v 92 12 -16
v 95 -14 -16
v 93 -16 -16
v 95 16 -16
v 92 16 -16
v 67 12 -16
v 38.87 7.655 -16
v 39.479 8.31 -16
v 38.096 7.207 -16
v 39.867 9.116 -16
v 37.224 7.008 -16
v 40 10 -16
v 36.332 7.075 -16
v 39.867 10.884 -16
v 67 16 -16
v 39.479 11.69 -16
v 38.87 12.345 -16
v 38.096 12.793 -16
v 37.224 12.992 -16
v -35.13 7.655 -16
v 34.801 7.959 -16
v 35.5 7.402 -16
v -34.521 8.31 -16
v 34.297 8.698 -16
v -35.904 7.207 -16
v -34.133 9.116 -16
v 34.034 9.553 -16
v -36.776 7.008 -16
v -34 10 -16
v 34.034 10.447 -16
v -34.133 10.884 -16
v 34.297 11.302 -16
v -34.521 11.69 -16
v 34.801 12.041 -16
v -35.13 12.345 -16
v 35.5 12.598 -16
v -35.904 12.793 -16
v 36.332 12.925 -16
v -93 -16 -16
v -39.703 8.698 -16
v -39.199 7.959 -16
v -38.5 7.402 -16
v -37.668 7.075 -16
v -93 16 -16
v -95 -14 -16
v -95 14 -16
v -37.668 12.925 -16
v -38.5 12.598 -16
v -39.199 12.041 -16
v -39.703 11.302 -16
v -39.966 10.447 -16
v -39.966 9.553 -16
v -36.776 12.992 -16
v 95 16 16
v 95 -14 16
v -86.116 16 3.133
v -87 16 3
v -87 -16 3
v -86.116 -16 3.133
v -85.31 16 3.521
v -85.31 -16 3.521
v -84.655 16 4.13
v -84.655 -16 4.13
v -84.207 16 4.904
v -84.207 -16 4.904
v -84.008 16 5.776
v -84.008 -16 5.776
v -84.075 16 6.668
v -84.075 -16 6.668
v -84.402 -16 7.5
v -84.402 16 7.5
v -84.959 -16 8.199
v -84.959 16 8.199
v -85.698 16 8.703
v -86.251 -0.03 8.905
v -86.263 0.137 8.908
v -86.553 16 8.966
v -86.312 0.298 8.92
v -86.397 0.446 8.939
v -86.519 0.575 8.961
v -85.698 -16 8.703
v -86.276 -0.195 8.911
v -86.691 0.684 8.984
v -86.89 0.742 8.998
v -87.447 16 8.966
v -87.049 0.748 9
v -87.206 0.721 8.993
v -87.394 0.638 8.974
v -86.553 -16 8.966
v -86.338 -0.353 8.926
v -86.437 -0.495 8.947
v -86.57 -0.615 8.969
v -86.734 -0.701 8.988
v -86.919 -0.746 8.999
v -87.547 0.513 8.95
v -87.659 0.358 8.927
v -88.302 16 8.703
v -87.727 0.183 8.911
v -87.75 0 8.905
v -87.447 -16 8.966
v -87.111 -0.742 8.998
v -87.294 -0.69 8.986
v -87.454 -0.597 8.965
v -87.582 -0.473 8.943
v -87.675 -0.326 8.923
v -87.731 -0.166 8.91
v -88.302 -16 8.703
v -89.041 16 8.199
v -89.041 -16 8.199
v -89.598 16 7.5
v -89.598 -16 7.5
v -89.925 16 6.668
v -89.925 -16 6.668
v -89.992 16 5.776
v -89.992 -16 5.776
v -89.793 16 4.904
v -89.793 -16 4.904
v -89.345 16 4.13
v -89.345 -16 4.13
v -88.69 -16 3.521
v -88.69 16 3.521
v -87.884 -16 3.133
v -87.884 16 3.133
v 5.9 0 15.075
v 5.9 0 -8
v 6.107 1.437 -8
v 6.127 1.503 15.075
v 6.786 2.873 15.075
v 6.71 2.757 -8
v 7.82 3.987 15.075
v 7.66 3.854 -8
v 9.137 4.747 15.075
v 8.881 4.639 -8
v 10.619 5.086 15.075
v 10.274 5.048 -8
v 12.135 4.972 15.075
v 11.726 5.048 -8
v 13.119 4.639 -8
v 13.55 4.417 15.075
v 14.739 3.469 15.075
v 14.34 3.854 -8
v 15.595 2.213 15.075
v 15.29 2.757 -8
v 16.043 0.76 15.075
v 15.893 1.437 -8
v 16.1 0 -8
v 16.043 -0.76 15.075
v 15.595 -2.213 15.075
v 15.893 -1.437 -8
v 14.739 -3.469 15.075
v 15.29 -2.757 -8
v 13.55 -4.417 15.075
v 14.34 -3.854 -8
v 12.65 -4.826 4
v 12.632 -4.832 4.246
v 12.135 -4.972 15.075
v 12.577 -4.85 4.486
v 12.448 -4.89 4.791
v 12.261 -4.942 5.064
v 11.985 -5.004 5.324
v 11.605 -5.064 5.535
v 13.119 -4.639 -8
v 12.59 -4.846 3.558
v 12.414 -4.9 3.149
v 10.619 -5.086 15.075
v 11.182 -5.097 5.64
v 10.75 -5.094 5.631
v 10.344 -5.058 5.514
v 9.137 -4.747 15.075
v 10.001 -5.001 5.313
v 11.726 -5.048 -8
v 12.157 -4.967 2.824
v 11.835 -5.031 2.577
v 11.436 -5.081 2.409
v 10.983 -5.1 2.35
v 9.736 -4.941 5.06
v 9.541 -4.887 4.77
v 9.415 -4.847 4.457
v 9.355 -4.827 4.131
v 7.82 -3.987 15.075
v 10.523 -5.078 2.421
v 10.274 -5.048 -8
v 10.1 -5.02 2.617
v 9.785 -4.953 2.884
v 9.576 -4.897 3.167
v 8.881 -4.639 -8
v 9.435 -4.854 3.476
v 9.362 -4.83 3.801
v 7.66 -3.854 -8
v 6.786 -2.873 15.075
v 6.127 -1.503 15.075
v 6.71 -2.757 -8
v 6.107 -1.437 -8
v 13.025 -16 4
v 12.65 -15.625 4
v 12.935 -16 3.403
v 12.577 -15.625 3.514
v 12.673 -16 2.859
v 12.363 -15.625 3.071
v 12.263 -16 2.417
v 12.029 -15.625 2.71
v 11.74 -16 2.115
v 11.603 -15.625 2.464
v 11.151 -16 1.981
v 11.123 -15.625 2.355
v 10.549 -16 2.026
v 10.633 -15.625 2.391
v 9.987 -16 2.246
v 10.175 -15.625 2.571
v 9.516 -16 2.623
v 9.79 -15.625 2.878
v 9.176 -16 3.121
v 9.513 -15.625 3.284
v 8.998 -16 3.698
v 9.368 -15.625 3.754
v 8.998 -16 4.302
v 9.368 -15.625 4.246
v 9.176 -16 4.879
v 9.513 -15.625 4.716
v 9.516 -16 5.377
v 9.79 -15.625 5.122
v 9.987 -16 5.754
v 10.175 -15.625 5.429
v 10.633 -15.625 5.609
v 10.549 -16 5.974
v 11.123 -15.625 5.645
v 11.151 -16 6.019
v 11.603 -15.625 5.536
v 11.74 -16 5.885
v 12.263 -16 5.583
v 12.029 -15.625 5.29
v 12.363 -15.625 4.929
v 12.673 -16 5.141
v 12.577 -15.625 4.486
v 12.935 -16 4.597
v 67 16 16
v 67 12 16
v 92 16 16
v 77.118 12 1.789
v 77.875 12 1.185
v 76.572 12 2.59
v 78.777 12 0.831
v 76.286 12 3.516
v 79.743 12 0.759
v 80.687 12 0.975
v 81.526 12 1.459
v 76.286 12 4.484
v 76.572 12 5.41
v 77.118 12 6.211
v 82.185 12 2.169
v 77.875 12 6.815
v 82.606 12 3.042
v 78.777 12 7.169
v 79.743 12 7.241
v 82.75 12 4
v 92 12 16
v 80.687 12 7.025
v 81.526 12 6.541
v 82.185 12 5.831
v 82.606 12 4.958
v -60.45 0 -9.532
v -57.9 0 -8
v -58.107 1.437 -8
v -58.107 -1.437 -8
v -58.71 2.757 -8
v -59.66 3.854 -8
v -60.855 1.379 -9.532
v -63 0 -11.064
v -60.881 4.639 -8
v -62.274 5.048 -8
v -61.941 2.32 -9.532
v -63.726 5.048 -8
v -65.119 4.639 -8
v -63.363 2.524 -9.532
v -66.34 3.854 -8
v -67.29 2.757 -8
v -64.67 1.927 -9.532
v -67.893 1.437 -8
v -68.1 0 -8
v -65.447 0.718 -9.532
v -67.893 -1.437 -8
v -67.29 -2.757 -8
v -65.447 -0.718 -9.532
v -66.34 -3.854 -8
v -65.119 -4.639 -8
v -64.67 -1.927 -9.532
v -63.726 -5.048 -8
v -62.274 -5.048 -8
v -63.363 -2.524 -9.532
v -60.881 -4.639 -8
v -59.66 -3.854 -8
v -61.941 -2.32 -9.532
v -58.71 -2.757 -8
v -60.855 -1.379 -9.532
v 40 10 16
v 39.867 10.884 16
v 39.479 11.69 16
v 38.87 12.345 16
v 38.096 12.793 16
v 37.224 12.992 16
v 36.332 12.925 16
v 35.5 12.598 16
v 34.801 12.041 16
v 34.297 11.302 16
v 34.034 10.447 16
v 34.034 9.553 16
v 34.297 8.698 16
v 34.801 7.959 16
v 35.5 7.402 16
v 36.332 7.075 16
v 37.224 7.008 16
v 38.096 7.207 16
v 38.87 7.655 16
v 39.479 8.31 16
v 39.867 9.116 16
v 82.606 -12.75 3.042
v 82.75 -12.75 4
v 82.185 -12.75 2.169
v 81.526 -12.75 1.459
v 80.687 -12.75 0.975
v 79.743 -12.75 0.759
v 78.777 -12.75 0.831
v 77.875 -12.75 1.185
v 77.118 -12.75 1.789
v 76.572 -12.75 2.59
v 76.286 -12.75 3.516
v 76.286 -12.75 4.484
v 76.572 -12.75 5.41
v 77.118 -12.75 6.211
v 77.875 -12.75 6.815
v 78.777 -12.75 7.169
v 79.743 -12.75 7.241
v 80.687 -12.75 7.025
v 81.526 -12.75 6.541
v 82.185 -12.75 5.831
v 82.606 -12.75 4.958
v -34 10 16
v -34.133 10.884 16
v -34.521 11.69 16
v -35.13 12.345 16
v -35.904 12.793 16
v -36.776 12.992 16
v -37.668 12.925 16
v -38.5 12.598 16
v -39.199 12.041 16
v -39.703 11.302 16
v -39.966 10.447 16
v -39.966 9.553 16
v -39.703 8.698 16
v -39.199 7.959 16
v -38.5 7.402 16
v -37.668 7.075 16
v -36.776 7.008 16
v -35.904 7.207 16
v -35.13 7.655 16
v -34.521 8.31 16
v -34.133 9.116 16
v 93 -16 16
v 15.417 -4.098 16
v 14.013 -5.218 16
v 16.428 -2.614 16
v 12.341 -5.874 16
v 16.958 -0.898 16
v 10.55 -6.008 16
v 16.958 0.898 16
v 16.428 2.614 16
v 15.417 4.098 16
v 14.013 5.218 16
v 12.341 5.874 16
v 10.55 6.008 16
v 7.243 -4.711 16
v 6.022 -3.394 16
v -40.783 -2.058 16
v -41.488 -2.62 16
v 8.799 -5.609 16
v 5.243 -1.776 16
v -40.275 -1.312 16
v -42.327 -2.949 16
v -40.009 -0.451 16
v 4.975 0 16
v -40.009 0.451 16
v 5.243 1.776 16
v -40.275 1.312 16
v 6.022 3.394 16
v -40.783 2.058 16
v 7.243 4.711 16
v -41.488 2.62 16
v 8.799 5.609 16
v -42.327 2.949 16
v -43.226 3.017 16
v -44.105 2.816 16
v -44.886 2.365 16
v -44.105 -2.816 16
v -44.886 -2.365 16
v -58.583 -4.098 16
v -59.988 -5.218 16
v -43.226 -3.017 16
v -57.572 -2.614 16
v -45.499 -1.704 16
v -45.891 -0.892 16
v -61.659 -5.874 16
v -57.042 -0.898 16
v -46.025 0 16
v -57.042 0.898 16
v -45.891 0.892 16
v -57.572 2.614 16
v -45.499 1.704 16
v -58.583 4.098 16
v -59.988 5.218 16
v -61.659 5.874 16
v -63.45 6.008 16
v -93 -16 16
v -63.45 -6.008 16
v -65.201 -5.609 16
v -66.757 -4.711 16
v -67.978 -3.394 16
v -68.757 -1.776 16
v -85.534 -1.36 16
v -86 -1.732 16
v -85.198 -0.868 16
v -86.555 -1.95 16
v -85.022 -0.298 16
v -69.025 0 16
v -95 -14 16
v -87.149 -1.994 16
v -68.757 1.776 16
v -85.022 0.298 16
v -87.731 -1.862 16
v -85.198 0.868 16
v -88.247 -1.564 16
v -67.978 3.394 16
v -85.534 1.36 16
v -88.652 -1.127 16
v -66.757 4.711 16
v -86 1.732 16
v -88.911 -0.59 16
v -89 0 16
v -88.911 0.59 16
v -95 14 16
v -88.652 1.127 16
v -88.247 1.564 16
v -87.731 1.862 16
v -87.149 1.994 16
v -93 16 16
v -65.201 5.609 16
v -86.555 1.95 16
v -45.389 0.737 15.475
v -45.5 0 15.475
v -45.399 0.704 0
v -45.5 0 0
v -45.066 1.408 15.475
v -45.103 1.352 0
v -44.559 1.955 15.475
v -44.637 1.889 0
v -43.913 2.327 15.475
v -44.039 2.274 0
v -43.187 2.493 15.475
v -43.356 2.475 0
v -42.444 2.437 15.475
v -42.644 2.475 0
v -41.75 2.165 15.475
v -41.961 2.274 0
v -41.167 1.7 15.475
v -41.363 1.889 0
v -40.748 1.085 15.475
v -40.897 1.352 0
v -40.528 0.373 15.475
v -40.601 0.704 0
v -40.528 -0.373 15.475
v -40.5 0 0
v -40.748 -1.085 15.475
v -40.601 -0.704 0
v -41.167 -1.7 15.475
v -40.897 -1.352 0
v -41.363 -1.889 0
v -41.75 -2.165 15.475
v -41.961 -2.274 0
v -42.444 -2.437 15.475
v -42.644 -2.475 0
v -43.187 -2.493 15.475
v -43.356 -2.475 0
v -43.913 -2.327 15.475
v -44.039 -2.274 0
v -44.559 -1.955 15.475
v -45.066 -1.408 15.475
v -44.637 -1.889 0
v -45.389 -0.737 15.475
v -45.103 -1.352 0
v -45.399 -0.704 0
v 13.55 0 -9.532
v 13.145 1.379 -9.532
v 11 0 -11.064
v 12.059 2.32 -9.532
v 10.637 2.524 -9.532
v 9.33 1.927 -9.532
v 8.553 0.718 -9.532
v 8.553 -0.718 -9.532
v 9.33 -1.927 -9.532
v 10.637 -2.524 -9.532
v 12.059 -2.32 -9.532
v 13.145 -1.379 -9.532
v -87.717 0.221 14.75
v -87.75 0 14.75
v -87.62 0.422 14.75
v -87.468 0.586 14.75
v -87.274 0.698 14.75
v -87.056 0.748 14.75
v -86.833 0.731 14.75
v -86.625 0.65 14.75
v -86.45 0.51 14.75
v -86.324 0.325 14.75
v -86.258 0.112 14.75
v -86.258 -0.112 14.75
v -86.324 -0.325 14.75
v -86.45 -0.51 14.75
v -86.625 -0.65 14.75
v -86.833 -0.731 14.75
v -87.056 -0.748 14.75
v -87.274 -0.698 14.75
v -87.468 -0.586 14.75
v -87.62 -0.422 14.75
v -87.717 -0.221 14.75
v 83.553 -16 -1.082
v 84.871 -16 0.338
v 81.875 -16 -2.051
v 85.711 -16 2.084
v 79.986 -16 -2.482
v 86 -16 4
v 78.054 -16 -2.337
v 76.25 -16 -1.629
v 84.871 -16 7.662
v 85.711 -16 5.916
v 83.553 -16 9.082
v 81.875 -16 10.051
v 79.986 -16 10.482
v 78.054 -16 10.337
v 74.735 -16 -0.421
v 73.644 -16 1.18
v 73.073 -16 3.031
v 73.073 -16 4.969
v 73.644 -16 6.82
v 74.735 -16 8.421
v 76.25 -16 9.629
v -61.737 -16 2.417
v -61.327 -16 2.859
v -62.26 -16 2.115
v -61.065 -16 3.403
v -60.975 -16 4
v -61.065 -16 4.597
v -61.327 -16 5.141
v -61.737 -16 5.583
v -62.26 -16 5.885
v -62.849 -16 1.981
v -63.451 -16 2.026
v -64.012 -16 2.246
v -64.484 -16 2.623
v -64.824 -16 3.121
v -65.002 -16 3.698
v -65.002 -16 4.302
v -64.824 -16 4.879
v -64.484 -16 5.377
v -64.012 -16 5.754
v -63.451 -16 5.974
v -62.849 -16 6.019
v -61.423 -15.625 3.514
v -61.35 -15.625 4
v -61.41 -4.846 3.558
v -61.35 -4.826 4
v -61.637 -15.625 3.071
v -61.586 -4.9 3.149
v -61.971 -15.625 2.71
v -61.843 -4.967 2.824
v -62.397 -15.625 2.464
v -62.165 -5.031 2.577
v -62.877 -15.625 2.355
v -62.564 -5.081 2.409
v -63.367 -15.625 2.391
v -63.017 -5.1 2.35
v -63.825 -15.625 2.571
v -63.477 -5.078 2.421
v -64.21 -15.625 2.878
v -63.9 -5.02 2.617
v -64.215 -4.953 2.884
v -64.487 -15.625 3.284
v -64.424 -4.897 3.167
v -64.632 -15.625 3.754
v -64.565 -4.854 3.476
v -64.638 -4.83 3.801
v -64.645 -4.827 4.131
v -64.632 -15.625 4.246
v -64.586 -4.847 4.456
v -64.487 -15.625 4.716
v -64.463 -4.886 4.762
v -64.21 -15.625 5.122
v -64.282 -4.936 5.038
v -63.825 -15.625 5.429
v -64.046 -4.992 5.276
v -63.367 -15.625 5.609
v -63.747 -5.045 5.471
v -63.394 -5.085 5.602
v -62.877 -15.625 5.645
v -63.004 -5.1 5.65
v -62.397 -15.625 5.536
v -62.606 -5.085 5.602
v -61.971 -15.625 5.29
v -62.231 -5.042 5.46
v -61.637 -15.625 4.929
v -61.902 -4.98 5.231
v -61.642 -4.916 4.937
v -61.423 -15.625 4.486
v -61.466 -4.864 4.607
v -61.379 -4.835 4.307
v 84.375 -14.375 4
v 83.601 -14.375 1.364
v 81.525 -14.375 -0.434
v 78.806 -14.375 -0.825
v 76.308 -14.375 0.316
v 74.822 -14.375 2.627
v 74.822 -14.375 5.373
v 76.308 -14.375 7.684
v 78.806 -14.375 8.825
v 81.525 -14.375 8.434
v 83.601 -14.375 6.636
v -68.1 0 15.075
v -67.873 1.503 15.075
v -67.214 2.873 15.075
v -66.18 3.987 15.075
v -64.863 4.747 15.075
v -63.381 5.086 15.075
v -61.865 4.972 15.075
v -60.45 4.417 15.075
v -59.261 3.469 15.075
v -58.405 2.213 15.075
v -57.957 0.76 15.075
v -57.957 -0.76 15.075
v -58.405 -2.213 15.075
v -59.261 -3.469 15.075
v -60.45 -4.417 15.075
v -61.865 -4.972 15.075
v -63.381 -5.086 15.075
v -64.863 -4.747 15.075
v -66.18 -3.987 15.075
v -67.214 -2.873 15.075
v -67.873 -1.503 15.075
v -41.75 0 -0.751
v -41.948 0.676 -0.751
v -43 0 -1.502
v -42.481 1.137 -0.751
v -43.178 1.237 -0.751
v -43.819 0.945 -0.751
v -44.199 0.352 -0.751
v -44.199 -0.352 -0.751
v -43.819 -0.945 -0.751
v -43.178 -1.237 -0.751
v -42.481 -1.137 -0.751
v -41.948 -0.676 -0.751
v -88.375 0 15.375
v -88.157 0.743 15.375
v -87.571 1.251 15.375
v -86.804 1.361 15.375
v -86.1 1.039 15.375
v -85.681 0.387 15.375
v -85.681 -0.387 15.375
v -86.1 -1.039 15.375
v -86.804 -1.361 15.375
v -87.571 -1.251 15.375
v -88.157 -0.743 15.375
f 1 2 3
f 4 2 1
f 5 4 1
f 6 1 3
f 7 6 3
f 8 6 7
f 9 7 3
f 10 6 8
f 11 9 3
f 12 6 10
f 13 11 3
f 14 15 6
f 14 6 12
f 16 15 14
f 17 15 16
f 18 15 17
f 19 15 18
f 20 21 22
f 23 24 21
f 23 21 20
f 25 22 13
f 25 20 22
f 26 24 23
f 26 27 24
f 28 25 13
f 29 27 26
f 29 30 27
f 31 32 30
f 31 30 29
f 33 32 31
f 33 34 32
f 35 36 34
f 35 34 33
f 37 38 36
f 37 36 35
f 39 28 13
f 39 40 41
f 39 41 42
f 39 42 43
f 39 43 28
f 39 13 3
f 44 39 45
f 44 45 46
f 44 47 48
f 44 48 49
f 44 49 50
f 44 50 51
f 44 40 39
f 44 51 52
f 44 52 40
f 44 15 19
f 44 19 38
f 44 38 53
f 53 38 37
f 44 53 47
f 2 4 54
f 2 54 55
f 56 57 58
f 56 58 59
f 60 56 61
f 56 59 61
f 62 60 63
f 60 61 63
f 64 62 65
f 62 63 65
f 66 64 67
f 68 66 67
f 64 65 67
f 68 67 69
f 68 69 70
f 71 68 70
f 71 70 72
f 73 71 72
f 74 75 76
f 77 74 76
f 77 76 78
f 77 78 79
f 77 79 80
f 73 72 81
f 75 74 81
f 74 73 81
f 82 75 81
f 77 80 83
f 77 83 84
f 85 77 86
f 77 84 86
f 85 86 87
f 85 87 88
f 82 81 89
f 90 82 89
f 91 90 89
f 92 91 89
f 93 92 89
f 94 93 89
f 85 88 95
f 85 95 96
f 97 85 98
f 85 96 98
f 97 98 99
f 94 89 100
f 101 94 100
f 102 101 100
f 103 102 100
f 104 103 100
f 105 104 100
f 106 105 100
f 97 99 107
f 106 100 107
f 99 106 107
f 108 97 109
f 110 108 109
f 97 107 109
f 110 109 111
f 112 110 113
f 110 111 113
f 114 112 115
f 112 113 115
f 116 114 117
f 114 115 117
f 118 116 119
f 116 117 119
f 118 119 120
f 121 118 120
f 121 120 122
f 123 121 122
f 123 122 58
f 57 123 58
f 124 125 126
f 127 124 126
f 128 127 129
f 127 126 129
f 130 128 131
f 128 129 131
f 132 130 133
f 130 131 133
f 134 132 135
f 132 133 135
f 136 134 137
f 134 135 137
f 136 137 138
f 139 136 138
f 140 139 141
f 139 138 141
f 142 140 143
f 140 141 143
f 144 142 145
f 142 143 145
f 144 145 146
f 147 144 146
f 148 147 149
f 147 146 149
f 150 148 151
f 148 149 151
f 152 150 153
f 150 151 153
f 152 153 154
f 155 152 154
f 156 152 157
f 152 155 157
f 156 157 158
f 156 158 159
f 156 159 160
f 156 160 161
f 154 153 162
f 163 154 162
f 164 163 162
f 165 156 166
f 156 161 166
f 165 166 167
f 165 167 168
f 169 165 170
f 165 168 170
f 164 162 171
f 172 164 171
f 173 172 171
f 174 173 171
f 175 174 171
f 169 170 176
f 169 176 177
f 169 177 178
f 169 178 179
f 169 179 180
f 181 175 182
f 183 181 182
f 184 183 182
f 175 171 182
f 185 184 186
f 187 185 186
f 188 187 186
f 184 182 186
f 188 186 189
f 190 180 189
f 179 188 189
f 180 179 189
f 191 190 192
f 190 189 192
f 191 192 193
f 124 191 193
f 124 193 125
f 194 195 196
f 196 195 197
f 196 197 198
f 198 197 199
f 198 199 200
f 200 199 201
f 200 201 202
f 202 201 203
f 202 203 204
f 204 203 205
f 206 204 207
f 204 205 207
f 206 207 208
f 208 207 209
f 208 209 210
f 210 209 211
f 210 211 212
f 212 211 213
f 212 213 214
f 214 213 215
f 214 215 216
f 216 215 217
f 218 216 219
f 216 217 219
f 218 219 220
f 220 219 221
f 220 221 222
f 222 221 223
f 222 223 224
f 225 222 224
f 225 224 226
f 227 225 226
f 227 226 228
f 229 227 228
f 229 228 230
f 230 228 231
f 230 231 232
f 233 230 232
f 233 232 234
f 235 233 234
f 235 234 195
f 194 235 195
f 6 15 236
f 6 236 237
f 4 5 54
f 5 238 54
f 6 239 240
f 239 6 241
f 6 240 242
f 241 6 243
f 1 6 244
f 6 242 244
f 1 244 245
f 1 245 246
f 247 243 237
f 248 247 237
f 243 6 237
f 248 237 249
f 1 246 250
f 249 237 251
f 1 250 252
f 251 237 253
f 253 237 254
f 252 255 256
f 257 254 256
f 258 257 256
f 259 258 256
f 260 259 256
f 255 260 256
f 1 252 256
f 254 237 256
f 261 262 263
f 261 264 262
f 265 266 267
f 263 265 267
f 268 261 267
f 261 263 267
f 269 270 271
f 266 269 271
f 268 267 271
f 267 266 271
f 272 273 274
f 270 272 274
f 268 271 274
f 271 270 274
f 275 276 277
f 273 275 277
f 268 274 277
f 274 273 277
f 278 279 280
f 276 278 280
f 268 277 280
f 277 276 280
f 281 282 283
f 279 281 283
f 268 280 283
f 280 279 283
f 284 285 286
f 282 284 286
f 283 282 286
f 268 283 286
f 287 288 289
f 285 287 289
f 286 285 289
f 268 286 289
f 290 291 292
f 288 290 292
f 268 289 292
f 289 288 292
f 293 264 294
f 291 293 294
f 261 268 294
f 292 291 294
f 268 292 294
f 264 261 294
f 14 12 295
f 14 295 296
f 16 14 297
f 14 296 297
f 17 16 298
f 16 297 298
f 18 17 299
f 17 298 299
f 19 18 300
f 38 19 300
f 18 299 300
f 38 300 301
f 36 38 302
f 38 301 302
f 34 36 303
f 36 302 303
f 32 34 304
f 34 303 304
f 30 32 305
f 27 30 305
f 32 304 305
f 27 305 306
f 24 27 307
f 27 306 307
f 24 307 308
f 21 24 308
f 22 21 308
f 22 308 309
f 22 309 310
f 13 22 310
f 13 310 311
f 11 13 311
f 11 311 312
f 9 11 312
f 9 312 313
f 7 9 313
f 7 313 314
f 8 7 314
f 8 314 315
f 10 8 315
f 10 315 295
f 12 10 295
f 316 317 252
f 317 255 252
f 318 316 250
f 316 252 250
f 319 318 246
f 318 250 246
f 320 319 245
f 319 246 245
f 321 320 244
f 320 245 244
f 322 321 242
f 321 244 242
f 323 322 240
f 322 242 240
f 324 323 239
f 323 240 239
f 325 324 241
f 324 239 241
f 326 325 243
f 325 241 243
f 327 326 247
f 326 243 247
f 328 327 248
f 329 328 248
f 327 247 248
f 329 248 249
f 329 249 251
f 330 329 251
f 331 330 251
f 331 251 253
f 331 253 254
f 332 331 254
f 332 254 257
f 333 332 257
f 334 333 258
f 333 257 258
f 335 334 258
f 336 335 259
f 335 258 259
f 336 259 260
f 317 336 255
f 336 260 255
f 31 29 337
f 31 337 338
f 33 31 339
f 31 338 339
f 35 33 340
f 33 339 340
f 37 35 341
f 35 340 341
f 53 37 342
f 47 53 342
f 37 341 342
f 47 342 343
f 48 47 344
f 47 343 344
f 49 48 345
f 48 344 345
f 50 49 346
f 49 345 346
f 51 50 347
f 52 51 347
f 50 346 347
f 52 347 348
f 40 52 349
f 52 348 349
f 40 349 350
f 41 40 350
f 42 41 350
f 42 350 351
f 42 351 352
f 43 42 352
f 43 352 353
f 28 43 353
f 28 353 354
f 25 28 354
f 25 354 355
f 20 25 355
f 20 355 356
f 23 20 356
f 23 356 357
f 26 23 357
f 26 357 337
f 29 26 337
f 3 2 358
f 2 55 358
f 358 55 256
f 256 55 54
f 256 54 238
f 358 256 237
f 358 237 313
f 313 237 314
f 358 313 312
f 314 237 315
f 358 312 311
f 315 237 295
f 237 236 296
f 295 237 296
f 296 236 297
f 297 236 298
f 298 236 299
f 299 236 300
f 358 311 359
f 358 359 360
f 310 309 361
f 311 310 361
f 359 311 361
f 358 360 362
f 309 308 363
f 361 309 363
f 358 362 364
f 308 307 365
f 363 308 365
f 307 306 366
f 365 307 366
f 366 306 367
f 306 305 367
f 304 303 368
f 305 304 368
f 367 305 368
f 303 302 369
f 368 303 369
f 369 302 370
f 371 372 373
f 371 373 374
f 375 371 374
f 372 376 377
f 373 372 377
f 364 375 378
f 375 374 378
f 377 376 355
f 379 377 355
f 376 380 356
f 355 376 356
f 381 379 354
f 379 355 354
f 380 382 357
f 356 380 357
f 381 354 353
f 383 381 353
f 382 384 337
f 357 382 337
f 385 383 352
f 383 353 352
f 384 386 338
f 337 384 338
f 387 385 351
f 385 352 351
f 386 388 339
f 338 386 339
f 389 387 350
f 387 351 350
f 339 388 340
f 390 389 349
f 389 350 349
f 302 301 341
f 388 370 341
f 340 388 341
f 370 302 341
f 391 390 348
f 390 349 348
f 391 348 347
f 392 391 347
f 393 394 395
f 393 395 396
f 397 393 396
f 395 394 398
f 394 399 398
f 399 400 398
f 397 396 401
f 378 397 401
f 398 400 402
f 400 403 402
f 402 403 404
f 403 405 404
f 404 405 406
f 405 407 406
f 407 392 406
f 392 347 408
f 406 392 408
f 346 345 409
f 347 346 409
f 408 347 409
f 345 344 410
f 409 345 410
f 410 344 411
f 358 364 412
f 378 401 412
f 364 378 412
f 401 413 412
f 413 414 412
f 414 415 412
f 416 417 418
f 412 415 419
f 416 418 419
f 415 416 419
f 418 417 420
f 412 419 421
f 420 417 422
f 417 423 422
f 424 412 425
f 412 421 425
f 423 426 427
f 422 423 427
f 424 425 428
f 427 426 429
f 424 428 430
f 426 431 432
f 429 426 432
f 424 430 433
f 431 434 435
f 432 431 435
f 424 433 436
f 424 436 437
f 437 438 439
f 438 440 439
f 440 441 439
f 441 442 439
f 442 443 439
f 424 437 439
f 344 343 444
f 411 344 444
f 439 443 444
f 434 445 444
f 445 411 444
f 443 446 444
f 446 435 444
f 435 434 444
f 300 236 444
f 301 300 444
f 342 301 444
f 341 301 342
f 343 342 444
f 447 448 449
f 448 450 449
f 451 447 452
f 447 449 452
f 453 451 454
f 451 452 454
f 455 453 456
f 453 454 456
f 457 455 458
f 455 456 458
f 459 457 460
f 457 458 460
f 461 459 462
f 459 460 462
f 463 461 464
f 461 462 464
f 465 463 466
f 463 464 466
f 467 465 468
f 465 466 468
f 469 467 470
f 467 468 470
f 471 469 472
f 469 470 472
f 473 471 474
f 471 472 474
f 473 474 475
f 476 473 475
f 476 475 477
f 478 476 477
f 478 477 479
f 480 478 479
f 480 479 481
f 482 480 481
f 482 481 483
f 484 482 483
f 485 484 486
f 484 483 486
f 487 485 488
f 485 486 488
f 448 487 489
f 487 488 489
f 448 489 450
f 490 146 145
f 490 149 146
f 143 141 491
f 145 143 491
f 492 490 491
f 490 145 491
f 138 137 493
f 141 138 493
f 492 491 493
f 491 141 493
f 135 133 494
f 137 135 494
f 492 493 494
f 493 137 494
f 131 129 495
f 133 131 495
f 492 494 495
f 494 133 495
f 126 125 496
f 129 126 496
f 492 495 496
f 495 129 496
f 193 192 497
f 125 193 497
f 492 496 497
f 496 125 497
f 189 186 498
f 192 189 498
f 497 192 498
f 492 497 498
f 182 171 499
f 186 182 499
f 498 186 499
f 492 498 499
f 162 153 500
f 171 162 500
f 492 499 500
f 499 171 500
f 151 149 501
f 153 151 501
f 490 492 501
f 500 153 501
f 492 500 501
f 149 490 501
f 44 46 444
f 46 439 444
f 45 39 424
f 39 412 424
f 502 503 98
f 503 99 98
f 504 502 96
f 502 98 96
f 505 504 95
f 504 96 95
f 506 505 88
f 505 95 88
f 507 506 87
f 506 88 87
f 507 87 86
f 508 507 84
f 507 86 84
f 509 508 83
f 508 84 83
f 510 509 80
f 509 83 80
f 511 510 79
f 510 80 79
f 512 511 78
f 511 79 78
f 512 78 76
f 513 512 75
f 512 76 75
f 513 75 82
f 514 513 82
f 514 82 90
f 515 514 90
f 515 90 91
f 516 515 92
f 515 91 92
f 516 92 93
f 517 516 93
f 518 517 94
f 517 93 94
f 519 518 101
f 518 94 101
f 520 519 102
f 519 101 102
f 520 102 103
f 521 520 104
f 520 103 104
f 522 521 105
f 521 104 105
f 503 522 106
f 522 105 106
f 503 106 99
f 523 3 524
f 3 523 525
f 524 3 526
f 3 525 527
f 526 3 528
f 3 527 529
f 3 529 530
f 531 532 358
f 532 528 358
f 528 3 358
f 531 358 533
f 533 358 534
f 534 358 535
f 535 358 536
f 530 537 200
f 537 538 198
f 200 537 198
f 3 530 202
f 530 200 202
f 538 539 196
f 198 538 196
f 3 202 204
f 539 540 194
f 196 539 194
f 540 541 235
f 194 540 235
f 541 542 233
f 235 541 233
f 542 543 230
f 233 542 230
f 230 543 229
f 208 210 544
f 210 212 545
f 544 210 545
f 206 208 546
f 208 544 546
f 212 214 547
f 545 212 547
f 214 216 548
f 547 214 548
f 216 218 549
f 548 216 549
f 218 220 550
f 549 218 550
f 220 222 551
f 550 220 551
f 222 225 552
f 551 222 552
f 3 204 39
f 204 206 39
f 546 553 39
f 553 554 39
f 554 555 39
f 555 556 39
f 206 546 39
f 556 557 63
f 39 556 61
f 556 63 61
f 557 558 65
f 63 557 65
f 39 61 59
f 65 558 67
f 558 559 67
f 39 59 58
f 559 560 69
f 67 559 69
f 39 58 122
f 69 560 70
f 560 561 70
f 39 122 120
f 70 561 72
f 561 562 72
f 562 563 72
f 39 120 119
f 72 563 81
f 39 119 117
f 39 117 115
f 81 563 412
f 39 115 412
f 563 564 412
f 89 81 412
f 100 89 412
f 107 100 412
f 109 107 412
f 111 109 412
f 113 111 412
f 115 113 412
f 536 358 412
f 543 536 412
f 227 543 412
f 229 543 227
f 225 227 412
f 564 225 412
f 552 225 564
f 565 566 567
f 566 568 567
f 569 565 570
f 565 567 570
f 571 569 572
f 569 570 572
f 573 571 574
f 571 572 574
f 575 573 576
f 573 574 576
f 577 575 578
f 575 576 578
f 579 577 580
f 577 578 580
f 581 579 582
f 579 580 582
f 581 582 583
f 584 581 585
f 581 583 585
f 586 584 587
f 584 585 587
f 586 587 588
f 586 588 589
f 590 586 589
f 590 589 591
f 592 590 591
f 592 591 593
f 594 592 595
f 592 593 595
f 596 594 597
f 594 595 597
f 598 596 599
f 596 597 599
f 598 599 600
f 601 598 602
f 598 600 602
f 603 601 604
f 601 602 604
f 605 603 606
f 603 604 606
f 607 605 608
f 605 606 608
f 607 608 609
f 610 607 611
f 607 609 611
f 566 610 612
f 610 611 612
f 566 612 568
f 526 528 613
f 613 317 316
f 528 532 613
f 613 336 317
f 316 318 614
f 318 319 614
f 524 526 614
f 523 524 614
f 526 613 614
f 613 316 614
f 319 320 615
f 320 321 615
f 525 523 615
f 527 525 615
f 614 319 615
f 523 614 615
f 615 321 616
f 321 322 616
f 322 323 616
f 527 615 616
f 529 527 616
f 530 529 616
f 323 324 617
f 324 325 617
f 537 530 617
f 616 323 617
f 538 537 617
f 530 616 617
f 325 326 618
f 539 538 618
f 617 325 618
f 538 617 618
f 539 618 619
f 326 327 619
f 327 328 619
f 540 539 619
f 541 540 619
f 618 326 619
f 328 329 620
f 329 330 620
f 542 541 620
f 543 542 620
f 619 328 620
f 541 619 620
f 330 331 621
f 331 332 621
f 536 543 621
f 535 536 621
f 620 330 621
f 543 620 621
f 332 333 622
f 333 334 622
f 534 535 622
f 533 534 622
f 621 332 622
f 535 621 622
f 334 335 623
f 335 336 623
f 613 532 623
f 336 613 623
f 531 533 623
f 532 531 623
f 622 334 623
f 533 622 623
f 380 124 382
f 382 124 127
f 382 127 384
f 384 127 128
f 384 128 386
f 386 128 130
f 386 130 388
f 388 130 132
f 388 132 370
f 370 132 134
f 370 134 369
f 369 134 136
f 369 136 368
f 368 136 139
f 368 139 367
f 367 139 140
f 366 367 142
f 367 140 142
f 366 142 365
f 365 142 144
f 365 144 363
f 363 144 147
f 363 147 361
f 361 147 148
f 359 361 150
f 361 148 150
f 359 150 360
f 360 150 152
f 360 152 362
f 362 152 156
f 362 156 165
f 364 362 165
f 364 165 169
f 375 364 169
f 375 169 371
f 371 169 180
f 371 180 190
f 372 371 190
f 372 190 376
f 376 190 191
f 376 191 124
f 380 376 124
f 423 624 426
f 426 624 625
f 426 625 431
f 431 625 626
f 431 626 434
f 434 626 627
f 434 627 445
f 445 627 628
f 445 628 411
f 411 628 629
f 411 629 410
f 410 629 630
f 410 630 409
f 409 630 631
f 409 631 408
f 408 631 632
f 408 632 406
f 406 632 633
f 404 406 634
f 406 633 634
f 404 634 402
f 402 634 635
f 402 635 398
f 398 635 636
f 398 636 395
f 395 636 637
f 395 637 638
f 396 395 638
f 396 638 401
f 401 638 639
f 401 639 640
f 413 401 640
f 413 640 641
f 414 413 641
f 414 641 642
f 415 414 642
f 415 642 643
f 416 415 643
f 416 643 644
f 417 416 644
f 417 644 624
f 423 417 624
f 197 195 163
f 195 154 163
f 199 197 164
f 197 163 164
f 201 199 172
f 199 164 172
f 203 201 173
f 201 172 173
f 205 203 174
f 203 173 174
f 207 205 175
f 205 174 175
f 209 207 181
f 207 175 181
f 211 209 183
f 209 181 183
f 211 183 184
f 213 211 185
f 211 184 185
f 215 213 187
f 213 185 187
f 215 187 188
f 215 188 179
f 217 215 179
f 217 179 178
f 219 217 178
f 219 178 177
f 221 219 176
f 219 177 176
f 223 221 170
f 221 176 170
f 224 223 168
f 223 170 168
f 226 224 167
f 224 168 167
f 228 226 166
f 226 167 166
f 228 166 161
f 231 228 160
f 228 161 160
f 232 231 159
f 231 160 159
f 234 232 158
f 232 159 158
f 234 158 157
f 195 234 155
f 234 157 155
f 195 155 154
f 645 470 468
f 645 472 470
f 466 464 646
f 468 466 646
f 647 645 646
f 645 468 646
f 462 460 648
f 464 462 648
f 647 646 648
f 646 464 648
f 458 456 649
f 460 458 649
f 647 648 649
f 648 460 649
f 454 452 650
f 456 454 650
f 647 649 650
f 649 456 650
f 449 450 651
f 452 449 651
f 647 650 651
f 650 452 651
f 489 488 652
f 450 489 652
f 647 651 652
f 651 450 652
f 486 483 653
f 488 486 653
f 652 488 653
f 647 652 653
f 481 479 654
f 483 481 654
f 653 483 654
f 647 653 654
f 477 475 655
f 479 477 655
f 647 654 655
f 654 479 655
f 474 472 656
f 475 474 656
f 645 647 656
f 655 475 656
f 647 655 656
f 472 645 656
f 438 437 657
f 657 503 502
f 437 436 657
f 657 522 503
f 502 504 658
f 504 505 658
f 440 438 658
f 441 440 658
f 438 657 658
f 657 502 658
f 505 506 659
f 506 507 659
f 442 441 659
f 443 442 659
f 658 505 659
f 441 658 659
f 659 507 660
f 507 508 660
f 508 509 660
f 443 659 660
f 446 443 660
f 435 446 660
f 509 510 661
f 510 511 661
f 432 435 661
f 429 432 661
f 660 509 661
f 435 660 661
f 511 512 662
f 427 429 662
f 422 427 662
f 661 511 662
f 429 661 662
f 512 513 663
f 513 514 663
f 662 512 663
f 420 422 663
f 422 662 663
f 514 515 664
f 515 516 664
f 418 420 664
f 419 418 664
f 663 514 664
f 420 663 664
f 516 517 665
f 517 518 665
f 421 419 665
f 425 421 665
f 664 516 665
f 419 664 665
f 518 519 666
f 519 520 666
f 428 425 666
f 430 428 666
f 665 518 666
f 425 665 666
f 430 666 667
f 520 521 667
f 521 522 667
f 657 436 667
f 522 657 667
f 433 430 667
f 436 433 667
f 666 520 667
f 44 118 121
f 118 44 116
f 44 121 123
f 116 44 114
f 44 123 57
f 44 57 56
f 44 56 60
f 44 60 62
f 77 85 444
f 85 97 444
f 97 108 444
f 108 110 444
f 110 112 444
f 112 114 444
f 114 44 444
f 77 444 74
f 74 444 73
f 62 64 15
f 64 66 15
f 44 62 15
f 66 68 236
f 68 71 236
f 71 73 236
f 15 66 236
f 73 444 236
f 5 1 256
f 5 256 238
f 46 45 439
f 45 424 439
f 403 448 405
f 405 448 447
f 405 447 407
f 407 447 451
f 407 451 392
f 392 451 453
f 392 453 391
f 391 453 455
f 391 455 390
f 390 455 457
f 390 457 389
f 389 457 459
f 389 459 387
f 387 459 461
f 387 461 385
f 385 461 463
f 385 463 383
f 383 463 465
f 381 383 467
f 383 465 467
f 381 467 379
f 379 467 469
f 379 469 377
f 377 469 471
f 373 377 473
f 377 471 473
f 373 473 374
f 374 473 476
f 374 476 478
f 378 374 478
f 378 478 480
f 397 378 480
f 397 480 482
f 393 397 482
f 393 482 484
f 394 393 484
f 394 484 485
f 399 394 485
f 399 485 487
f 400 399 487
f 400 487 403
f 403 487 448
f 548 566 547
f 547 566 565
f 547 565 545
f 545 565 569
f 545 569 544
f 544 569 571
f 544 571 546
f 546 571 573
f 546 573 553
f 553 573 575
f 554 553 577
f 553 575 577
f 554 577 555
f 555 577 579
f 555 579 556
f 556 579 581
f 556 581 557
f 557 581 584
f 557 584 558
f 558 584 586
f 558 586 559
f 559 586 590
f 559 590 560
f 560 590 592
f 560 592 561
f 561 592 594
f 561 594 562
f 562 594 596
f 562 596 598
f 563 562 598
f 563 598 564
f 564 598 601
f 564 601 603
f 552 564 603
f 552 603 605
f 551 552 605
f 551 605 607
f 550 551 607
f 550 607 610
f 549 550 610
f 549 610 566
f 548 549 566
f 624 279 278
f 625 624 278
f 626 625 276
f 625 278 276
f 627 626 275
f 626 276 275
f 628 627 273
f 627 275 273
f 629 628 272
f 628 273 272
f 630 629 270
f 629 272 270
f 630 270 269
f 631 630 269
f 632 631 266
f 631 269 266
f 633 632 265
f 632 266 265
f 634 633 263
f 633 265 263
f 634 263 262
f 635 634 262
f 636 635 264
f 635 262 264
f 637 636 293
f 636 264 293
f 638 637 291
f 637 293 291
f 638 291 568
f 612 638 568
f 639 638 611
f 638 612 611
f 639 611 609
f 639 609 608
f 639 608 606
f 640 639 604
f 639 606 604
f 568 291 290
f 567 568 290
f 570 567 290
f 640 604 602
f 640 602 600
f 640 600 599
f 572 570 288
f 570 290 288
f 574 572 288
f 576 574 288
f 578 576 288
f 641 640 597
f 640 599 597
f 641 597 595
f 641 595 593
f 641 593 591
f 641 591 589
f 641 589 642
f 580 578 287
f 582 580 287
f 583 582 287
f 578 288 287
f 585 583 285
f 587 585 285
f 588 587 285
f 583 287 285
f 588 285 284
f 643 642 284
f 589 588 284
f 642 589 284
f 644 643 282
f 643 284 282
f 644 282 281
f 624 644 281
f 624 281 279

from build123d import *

# Parameters (mm, degrees)
BOSS_EXTRUDE1_DEPTH                                  = 16
M12_TAPPED_HOLE2_D                                   = 10.2
M12_TAPPED_HOLE2_DEPTH                               = 24
M12_TAPPED_HOLE2_CSINK_D                             = 12.05
M12_TAPPED_HOLE2_CSINK_ANGLE                         = 90
M12_TAPPED_HOLE2_TIP                                 = 3.064389157
M4_TAPPED_HOLE1_D                                    = 3.3
M4_TAPPED_HOLE1_DEPTH                                = 11.5
M4_TAPPED_HOLE1_CSINK_D                              = 4.05
M4_TAPPED_HOLE1_CSINK_ANGLE                          = 90
M4_TAPPED_HOLE1_TIP                                  = 0.991420021
SKETCH15_R                                           = 3
CUT_EXTRUDE1_DEPTH                                   = 102.513545894
CSK_FOR_M4_COUNTERSUNK_FLAT_HEAD_SCREW1_D            = 1.5
CSK_FOR_M4_COUNTERSUNK_FLAT_HEAD_SCREW1_DEPTH        = 10
CSK_FOR_M4_COUNTERSUNK_FLAT_HEAD_SCREW1_CSINK_D      = 4
CSK_FOR_M4_COUNTERSUNK_FLAT_HEAD_SCREW1_CSINK_ANGLE  = 90
CSK_FOR_M4_COUNTERSUNK_FLAT_HEAD_SCREW1_TIP          = 0.450645464
M6_TAPPED_HOLE1_D                                    = 5
M6_TAPPED_HOLE1_DEPTH                                = 16
M6_TAPPED_HOLE1_CSINK_D                              = 6.05
M6_TAPPED_HOLE1_CSINK_ANGLE                          = 90
M6_TAPPED_HOLE1_TIP                                  = 1.502151548
SKETCH22_R                                           = 3
CUT_EXTRUDE2_DEPTH                                   = 102.51354591
CSK_FOR_M10_COUNTERSUNK_FLAT_HEAD_SCREW2_D           = 6.5
CSK_FOR_M10_COUNTERSUNK_FLAT_HEAD_SCREW2_DEPTH       = 32
CSK_FOR_M10_COUNTERSUNK_FLAT_HEAD_SCREW2_CSINK_D     = 13
CSK_FOR_M10_COUNTERSUNK_FLAT_HEAD_SCREW2_CSINK_ANGLE = 90
CSK_FOR_M10_COUNTERSUNK_FLAT_HEAD_SCREW2_TIP         = 1.952797012


with BuildPart() as part:
    # Sketch1 → Boss-Extrude1 (new, symmetric)
    with BuildSketch(Plane.XY):
        Polygon((67, 12), (92, 12), (92, 16), (95, 16), (95, -14), (93, -16), (-93, -16), (-95, -14), (-95, 14), (-93, 16), (67, 16), align=None)
    extrude(amount=BOSS_EXTRUDE1_DEPTH, both=True)

    # M12 Tapped Hole2
    with Locations(Plane.XY.offset(16)):
        with Locations((-63, 0), (11, 0)):
            CounterSinkHole(M12_TAPPED_HOLE2_D / 2, M12_TAPPED_HOLE2_CSINK_D / 2, depth=M12_TAPPED_HOLE2_DEPTH, counter_sink_angle=M12_TAPPED_HOLE2_CSINK_ANGLE)
            with Locations((0, 0, -(M12_TAPPED_HOLE2_DEPTH + M12_TAPPED_HOLE2_TIP / 2))):  # 118° drill point
                Cone(0, M12_TAPPED_HOLE2_D / 2, M12_TAPPED_HOLE2_TIP, mode=Mode.SUBTRACT)

    # M4 Tapped Hole1
    with Locations(Plane(origin=(0, -16, 0), x_dir=(-1, 0, 0), z_dir=(0, -1, 0))):
        with Locations((-11, -4), (63, -4)):
            CounterSinkHole(M4_TAPPED_HOLE1_D / 2, M4_TAPPED_HOLE1_CSINK_D / 2, depth=M4_TAPPED_HOLE1_DEPTH, counter_sink_angle=M4_TAPPED_HOLE1_CSINK_ANGLE)
            with Locations((0, 0, -(M4_TAPPED_HOLE1_DEPTH + M4_TAPPED_HOLE1_TIP / 2))):  # 118° drill point
                Cone(0, M4_TAPPED_HOLE1_D / 2, M4_TAPPED_HOLE1_TIP, mode=Mode.SUBTRACT)

    # Sketch15 → Cut-Extrude1 (cut, through all)
    with BuildSketch(Plane.XZ.offset(16)):
        with Locations(Location((-87, 6, 0), (0, 0, 270))):
            Circle(SKETCH15_R)
    extrude(amount=-CUT_EXTRUDE1_DEPTH, mode=Mode.SUBTRACT)

    # CSK for M4 Countersunk Flat Head Screw1
    with Locations(Plane.XY.offset(16)):
        with Locations((-87, 0)):
            CounterSinkHole(CSK_FOR_M4_COUNTERSUNK_FLAT_HEAD_SCREW1_D / 2, CSK_FOR_M4_COUNTERSUNK_FLAT_HEAD_SCREW1_CSINK_D / 2, depth=CSK_FOR_M4_COUNTERSUNK_FLAT_HEAD_SCREW1_DEPTH, counter_sink_angle=CSK_FOR_M4_COUNTERSUNK_FLAT_HEAD_SCREW1_CSINK_ANGLE)
            with Locations((0, 0, -(CSK_FOR_M4_COUNTERSUNK_FLAT_HEAD_SCREW1_DEPTH + CSK_FOR_M4_COUNTERSUNK_FLAT_HEAD_SCREW1_TIP / 2))):  # 118° drill point
                Cone(0, CSK_FOR_M4_COUNTERSUNK_FLAT_HEAD_SCREW1_D / 2, CSK_FOR_M4_COUNTERSUNK_FLAT_HEAD_SCREW1_TIP, mode=Mode.SUBTRACT)

    # M6 Tapped Hole1
    with Locations(Plane.XY.offset(16)):
        with Locations((-43, 0)):
            CounterSinkHole(M6_TAPPED_HOLE1_D / 2, M6_TAPPED_HOLE1_CSINK_D / 2, depth=M6_TAPPED_HOLE1_DEPTH, counter_sink_angle=M6_TAPPED_HOLE1_CSINK_ANGLE)
            with Locations((0, 0, -(M6_TAPPED_HOLE1_DEPTH + M6_TAPPED_HOLE1_TIP / 2))):  # 118° drill point
                Cone(0, M6_TAPPED_HOLE1_D / 2, M6_TAPPED_HOLE1_TIP, mode=Mode.SUBTRACT)

    # Sketch22 → Cut-Extrude2 (cut, through all)
    with BuildSketch(Plane.XY.offset(16)):
        with Locations((-37, 10)):
            Circle(SKETCH22_R)
        with Locations((37, 10)):
            Circle(SKETCH22_R)
    extrude(amount=-CUT_EXTRUDE2_DEPTH, mode=Mode.SUBTRACT)

    # CSK for M10 Countersunk Flat Head Screw2
    with Locations(Plane(origin=(0, -16, 0), x_dir=(-1, 0, 0), z_dir=(0, -1, 0))):
        with Locations((-79.5, -4)):
            CounterSinkHole(CSK_FOR_M10_COUNTERSUNK_FLAT_HEAD_SCREW2_D / 2, CSK_FOR_M10_COUNTERSUNK_FLAT_HEAD_SCREW2_CSINK_D / 2, depth=CSK_FOR_M10_COUNTERSUNK_FLAT_HEAD_SCREW2_DEPTH, counter_sink_angle=CSK_FOR_M10_COUNTERSUNK_FLAT_HEAD_SCREW2_CSINK_ANGLE)
            with Locations((0, 0, -(CSK_FOR_M10_COUNTERSUNK_FLAT_HEAD_SCREW2_DEPTH + CSK_FOR_M10_COUNTERSUNK_FLAT_HEAD_SCREW2_TIP / 2))):  # 118° drill point
                Cone(0, CSK_FOR_M10_COUNTERSUNK_FLAT_HEAD_SCREW2_D / 2, CSK_FOR_M10_COUNTERSUNK_FLAT_HEAD_SCREW2_TIP, mode=Mode.SUBTRACT)


solid = part.part
